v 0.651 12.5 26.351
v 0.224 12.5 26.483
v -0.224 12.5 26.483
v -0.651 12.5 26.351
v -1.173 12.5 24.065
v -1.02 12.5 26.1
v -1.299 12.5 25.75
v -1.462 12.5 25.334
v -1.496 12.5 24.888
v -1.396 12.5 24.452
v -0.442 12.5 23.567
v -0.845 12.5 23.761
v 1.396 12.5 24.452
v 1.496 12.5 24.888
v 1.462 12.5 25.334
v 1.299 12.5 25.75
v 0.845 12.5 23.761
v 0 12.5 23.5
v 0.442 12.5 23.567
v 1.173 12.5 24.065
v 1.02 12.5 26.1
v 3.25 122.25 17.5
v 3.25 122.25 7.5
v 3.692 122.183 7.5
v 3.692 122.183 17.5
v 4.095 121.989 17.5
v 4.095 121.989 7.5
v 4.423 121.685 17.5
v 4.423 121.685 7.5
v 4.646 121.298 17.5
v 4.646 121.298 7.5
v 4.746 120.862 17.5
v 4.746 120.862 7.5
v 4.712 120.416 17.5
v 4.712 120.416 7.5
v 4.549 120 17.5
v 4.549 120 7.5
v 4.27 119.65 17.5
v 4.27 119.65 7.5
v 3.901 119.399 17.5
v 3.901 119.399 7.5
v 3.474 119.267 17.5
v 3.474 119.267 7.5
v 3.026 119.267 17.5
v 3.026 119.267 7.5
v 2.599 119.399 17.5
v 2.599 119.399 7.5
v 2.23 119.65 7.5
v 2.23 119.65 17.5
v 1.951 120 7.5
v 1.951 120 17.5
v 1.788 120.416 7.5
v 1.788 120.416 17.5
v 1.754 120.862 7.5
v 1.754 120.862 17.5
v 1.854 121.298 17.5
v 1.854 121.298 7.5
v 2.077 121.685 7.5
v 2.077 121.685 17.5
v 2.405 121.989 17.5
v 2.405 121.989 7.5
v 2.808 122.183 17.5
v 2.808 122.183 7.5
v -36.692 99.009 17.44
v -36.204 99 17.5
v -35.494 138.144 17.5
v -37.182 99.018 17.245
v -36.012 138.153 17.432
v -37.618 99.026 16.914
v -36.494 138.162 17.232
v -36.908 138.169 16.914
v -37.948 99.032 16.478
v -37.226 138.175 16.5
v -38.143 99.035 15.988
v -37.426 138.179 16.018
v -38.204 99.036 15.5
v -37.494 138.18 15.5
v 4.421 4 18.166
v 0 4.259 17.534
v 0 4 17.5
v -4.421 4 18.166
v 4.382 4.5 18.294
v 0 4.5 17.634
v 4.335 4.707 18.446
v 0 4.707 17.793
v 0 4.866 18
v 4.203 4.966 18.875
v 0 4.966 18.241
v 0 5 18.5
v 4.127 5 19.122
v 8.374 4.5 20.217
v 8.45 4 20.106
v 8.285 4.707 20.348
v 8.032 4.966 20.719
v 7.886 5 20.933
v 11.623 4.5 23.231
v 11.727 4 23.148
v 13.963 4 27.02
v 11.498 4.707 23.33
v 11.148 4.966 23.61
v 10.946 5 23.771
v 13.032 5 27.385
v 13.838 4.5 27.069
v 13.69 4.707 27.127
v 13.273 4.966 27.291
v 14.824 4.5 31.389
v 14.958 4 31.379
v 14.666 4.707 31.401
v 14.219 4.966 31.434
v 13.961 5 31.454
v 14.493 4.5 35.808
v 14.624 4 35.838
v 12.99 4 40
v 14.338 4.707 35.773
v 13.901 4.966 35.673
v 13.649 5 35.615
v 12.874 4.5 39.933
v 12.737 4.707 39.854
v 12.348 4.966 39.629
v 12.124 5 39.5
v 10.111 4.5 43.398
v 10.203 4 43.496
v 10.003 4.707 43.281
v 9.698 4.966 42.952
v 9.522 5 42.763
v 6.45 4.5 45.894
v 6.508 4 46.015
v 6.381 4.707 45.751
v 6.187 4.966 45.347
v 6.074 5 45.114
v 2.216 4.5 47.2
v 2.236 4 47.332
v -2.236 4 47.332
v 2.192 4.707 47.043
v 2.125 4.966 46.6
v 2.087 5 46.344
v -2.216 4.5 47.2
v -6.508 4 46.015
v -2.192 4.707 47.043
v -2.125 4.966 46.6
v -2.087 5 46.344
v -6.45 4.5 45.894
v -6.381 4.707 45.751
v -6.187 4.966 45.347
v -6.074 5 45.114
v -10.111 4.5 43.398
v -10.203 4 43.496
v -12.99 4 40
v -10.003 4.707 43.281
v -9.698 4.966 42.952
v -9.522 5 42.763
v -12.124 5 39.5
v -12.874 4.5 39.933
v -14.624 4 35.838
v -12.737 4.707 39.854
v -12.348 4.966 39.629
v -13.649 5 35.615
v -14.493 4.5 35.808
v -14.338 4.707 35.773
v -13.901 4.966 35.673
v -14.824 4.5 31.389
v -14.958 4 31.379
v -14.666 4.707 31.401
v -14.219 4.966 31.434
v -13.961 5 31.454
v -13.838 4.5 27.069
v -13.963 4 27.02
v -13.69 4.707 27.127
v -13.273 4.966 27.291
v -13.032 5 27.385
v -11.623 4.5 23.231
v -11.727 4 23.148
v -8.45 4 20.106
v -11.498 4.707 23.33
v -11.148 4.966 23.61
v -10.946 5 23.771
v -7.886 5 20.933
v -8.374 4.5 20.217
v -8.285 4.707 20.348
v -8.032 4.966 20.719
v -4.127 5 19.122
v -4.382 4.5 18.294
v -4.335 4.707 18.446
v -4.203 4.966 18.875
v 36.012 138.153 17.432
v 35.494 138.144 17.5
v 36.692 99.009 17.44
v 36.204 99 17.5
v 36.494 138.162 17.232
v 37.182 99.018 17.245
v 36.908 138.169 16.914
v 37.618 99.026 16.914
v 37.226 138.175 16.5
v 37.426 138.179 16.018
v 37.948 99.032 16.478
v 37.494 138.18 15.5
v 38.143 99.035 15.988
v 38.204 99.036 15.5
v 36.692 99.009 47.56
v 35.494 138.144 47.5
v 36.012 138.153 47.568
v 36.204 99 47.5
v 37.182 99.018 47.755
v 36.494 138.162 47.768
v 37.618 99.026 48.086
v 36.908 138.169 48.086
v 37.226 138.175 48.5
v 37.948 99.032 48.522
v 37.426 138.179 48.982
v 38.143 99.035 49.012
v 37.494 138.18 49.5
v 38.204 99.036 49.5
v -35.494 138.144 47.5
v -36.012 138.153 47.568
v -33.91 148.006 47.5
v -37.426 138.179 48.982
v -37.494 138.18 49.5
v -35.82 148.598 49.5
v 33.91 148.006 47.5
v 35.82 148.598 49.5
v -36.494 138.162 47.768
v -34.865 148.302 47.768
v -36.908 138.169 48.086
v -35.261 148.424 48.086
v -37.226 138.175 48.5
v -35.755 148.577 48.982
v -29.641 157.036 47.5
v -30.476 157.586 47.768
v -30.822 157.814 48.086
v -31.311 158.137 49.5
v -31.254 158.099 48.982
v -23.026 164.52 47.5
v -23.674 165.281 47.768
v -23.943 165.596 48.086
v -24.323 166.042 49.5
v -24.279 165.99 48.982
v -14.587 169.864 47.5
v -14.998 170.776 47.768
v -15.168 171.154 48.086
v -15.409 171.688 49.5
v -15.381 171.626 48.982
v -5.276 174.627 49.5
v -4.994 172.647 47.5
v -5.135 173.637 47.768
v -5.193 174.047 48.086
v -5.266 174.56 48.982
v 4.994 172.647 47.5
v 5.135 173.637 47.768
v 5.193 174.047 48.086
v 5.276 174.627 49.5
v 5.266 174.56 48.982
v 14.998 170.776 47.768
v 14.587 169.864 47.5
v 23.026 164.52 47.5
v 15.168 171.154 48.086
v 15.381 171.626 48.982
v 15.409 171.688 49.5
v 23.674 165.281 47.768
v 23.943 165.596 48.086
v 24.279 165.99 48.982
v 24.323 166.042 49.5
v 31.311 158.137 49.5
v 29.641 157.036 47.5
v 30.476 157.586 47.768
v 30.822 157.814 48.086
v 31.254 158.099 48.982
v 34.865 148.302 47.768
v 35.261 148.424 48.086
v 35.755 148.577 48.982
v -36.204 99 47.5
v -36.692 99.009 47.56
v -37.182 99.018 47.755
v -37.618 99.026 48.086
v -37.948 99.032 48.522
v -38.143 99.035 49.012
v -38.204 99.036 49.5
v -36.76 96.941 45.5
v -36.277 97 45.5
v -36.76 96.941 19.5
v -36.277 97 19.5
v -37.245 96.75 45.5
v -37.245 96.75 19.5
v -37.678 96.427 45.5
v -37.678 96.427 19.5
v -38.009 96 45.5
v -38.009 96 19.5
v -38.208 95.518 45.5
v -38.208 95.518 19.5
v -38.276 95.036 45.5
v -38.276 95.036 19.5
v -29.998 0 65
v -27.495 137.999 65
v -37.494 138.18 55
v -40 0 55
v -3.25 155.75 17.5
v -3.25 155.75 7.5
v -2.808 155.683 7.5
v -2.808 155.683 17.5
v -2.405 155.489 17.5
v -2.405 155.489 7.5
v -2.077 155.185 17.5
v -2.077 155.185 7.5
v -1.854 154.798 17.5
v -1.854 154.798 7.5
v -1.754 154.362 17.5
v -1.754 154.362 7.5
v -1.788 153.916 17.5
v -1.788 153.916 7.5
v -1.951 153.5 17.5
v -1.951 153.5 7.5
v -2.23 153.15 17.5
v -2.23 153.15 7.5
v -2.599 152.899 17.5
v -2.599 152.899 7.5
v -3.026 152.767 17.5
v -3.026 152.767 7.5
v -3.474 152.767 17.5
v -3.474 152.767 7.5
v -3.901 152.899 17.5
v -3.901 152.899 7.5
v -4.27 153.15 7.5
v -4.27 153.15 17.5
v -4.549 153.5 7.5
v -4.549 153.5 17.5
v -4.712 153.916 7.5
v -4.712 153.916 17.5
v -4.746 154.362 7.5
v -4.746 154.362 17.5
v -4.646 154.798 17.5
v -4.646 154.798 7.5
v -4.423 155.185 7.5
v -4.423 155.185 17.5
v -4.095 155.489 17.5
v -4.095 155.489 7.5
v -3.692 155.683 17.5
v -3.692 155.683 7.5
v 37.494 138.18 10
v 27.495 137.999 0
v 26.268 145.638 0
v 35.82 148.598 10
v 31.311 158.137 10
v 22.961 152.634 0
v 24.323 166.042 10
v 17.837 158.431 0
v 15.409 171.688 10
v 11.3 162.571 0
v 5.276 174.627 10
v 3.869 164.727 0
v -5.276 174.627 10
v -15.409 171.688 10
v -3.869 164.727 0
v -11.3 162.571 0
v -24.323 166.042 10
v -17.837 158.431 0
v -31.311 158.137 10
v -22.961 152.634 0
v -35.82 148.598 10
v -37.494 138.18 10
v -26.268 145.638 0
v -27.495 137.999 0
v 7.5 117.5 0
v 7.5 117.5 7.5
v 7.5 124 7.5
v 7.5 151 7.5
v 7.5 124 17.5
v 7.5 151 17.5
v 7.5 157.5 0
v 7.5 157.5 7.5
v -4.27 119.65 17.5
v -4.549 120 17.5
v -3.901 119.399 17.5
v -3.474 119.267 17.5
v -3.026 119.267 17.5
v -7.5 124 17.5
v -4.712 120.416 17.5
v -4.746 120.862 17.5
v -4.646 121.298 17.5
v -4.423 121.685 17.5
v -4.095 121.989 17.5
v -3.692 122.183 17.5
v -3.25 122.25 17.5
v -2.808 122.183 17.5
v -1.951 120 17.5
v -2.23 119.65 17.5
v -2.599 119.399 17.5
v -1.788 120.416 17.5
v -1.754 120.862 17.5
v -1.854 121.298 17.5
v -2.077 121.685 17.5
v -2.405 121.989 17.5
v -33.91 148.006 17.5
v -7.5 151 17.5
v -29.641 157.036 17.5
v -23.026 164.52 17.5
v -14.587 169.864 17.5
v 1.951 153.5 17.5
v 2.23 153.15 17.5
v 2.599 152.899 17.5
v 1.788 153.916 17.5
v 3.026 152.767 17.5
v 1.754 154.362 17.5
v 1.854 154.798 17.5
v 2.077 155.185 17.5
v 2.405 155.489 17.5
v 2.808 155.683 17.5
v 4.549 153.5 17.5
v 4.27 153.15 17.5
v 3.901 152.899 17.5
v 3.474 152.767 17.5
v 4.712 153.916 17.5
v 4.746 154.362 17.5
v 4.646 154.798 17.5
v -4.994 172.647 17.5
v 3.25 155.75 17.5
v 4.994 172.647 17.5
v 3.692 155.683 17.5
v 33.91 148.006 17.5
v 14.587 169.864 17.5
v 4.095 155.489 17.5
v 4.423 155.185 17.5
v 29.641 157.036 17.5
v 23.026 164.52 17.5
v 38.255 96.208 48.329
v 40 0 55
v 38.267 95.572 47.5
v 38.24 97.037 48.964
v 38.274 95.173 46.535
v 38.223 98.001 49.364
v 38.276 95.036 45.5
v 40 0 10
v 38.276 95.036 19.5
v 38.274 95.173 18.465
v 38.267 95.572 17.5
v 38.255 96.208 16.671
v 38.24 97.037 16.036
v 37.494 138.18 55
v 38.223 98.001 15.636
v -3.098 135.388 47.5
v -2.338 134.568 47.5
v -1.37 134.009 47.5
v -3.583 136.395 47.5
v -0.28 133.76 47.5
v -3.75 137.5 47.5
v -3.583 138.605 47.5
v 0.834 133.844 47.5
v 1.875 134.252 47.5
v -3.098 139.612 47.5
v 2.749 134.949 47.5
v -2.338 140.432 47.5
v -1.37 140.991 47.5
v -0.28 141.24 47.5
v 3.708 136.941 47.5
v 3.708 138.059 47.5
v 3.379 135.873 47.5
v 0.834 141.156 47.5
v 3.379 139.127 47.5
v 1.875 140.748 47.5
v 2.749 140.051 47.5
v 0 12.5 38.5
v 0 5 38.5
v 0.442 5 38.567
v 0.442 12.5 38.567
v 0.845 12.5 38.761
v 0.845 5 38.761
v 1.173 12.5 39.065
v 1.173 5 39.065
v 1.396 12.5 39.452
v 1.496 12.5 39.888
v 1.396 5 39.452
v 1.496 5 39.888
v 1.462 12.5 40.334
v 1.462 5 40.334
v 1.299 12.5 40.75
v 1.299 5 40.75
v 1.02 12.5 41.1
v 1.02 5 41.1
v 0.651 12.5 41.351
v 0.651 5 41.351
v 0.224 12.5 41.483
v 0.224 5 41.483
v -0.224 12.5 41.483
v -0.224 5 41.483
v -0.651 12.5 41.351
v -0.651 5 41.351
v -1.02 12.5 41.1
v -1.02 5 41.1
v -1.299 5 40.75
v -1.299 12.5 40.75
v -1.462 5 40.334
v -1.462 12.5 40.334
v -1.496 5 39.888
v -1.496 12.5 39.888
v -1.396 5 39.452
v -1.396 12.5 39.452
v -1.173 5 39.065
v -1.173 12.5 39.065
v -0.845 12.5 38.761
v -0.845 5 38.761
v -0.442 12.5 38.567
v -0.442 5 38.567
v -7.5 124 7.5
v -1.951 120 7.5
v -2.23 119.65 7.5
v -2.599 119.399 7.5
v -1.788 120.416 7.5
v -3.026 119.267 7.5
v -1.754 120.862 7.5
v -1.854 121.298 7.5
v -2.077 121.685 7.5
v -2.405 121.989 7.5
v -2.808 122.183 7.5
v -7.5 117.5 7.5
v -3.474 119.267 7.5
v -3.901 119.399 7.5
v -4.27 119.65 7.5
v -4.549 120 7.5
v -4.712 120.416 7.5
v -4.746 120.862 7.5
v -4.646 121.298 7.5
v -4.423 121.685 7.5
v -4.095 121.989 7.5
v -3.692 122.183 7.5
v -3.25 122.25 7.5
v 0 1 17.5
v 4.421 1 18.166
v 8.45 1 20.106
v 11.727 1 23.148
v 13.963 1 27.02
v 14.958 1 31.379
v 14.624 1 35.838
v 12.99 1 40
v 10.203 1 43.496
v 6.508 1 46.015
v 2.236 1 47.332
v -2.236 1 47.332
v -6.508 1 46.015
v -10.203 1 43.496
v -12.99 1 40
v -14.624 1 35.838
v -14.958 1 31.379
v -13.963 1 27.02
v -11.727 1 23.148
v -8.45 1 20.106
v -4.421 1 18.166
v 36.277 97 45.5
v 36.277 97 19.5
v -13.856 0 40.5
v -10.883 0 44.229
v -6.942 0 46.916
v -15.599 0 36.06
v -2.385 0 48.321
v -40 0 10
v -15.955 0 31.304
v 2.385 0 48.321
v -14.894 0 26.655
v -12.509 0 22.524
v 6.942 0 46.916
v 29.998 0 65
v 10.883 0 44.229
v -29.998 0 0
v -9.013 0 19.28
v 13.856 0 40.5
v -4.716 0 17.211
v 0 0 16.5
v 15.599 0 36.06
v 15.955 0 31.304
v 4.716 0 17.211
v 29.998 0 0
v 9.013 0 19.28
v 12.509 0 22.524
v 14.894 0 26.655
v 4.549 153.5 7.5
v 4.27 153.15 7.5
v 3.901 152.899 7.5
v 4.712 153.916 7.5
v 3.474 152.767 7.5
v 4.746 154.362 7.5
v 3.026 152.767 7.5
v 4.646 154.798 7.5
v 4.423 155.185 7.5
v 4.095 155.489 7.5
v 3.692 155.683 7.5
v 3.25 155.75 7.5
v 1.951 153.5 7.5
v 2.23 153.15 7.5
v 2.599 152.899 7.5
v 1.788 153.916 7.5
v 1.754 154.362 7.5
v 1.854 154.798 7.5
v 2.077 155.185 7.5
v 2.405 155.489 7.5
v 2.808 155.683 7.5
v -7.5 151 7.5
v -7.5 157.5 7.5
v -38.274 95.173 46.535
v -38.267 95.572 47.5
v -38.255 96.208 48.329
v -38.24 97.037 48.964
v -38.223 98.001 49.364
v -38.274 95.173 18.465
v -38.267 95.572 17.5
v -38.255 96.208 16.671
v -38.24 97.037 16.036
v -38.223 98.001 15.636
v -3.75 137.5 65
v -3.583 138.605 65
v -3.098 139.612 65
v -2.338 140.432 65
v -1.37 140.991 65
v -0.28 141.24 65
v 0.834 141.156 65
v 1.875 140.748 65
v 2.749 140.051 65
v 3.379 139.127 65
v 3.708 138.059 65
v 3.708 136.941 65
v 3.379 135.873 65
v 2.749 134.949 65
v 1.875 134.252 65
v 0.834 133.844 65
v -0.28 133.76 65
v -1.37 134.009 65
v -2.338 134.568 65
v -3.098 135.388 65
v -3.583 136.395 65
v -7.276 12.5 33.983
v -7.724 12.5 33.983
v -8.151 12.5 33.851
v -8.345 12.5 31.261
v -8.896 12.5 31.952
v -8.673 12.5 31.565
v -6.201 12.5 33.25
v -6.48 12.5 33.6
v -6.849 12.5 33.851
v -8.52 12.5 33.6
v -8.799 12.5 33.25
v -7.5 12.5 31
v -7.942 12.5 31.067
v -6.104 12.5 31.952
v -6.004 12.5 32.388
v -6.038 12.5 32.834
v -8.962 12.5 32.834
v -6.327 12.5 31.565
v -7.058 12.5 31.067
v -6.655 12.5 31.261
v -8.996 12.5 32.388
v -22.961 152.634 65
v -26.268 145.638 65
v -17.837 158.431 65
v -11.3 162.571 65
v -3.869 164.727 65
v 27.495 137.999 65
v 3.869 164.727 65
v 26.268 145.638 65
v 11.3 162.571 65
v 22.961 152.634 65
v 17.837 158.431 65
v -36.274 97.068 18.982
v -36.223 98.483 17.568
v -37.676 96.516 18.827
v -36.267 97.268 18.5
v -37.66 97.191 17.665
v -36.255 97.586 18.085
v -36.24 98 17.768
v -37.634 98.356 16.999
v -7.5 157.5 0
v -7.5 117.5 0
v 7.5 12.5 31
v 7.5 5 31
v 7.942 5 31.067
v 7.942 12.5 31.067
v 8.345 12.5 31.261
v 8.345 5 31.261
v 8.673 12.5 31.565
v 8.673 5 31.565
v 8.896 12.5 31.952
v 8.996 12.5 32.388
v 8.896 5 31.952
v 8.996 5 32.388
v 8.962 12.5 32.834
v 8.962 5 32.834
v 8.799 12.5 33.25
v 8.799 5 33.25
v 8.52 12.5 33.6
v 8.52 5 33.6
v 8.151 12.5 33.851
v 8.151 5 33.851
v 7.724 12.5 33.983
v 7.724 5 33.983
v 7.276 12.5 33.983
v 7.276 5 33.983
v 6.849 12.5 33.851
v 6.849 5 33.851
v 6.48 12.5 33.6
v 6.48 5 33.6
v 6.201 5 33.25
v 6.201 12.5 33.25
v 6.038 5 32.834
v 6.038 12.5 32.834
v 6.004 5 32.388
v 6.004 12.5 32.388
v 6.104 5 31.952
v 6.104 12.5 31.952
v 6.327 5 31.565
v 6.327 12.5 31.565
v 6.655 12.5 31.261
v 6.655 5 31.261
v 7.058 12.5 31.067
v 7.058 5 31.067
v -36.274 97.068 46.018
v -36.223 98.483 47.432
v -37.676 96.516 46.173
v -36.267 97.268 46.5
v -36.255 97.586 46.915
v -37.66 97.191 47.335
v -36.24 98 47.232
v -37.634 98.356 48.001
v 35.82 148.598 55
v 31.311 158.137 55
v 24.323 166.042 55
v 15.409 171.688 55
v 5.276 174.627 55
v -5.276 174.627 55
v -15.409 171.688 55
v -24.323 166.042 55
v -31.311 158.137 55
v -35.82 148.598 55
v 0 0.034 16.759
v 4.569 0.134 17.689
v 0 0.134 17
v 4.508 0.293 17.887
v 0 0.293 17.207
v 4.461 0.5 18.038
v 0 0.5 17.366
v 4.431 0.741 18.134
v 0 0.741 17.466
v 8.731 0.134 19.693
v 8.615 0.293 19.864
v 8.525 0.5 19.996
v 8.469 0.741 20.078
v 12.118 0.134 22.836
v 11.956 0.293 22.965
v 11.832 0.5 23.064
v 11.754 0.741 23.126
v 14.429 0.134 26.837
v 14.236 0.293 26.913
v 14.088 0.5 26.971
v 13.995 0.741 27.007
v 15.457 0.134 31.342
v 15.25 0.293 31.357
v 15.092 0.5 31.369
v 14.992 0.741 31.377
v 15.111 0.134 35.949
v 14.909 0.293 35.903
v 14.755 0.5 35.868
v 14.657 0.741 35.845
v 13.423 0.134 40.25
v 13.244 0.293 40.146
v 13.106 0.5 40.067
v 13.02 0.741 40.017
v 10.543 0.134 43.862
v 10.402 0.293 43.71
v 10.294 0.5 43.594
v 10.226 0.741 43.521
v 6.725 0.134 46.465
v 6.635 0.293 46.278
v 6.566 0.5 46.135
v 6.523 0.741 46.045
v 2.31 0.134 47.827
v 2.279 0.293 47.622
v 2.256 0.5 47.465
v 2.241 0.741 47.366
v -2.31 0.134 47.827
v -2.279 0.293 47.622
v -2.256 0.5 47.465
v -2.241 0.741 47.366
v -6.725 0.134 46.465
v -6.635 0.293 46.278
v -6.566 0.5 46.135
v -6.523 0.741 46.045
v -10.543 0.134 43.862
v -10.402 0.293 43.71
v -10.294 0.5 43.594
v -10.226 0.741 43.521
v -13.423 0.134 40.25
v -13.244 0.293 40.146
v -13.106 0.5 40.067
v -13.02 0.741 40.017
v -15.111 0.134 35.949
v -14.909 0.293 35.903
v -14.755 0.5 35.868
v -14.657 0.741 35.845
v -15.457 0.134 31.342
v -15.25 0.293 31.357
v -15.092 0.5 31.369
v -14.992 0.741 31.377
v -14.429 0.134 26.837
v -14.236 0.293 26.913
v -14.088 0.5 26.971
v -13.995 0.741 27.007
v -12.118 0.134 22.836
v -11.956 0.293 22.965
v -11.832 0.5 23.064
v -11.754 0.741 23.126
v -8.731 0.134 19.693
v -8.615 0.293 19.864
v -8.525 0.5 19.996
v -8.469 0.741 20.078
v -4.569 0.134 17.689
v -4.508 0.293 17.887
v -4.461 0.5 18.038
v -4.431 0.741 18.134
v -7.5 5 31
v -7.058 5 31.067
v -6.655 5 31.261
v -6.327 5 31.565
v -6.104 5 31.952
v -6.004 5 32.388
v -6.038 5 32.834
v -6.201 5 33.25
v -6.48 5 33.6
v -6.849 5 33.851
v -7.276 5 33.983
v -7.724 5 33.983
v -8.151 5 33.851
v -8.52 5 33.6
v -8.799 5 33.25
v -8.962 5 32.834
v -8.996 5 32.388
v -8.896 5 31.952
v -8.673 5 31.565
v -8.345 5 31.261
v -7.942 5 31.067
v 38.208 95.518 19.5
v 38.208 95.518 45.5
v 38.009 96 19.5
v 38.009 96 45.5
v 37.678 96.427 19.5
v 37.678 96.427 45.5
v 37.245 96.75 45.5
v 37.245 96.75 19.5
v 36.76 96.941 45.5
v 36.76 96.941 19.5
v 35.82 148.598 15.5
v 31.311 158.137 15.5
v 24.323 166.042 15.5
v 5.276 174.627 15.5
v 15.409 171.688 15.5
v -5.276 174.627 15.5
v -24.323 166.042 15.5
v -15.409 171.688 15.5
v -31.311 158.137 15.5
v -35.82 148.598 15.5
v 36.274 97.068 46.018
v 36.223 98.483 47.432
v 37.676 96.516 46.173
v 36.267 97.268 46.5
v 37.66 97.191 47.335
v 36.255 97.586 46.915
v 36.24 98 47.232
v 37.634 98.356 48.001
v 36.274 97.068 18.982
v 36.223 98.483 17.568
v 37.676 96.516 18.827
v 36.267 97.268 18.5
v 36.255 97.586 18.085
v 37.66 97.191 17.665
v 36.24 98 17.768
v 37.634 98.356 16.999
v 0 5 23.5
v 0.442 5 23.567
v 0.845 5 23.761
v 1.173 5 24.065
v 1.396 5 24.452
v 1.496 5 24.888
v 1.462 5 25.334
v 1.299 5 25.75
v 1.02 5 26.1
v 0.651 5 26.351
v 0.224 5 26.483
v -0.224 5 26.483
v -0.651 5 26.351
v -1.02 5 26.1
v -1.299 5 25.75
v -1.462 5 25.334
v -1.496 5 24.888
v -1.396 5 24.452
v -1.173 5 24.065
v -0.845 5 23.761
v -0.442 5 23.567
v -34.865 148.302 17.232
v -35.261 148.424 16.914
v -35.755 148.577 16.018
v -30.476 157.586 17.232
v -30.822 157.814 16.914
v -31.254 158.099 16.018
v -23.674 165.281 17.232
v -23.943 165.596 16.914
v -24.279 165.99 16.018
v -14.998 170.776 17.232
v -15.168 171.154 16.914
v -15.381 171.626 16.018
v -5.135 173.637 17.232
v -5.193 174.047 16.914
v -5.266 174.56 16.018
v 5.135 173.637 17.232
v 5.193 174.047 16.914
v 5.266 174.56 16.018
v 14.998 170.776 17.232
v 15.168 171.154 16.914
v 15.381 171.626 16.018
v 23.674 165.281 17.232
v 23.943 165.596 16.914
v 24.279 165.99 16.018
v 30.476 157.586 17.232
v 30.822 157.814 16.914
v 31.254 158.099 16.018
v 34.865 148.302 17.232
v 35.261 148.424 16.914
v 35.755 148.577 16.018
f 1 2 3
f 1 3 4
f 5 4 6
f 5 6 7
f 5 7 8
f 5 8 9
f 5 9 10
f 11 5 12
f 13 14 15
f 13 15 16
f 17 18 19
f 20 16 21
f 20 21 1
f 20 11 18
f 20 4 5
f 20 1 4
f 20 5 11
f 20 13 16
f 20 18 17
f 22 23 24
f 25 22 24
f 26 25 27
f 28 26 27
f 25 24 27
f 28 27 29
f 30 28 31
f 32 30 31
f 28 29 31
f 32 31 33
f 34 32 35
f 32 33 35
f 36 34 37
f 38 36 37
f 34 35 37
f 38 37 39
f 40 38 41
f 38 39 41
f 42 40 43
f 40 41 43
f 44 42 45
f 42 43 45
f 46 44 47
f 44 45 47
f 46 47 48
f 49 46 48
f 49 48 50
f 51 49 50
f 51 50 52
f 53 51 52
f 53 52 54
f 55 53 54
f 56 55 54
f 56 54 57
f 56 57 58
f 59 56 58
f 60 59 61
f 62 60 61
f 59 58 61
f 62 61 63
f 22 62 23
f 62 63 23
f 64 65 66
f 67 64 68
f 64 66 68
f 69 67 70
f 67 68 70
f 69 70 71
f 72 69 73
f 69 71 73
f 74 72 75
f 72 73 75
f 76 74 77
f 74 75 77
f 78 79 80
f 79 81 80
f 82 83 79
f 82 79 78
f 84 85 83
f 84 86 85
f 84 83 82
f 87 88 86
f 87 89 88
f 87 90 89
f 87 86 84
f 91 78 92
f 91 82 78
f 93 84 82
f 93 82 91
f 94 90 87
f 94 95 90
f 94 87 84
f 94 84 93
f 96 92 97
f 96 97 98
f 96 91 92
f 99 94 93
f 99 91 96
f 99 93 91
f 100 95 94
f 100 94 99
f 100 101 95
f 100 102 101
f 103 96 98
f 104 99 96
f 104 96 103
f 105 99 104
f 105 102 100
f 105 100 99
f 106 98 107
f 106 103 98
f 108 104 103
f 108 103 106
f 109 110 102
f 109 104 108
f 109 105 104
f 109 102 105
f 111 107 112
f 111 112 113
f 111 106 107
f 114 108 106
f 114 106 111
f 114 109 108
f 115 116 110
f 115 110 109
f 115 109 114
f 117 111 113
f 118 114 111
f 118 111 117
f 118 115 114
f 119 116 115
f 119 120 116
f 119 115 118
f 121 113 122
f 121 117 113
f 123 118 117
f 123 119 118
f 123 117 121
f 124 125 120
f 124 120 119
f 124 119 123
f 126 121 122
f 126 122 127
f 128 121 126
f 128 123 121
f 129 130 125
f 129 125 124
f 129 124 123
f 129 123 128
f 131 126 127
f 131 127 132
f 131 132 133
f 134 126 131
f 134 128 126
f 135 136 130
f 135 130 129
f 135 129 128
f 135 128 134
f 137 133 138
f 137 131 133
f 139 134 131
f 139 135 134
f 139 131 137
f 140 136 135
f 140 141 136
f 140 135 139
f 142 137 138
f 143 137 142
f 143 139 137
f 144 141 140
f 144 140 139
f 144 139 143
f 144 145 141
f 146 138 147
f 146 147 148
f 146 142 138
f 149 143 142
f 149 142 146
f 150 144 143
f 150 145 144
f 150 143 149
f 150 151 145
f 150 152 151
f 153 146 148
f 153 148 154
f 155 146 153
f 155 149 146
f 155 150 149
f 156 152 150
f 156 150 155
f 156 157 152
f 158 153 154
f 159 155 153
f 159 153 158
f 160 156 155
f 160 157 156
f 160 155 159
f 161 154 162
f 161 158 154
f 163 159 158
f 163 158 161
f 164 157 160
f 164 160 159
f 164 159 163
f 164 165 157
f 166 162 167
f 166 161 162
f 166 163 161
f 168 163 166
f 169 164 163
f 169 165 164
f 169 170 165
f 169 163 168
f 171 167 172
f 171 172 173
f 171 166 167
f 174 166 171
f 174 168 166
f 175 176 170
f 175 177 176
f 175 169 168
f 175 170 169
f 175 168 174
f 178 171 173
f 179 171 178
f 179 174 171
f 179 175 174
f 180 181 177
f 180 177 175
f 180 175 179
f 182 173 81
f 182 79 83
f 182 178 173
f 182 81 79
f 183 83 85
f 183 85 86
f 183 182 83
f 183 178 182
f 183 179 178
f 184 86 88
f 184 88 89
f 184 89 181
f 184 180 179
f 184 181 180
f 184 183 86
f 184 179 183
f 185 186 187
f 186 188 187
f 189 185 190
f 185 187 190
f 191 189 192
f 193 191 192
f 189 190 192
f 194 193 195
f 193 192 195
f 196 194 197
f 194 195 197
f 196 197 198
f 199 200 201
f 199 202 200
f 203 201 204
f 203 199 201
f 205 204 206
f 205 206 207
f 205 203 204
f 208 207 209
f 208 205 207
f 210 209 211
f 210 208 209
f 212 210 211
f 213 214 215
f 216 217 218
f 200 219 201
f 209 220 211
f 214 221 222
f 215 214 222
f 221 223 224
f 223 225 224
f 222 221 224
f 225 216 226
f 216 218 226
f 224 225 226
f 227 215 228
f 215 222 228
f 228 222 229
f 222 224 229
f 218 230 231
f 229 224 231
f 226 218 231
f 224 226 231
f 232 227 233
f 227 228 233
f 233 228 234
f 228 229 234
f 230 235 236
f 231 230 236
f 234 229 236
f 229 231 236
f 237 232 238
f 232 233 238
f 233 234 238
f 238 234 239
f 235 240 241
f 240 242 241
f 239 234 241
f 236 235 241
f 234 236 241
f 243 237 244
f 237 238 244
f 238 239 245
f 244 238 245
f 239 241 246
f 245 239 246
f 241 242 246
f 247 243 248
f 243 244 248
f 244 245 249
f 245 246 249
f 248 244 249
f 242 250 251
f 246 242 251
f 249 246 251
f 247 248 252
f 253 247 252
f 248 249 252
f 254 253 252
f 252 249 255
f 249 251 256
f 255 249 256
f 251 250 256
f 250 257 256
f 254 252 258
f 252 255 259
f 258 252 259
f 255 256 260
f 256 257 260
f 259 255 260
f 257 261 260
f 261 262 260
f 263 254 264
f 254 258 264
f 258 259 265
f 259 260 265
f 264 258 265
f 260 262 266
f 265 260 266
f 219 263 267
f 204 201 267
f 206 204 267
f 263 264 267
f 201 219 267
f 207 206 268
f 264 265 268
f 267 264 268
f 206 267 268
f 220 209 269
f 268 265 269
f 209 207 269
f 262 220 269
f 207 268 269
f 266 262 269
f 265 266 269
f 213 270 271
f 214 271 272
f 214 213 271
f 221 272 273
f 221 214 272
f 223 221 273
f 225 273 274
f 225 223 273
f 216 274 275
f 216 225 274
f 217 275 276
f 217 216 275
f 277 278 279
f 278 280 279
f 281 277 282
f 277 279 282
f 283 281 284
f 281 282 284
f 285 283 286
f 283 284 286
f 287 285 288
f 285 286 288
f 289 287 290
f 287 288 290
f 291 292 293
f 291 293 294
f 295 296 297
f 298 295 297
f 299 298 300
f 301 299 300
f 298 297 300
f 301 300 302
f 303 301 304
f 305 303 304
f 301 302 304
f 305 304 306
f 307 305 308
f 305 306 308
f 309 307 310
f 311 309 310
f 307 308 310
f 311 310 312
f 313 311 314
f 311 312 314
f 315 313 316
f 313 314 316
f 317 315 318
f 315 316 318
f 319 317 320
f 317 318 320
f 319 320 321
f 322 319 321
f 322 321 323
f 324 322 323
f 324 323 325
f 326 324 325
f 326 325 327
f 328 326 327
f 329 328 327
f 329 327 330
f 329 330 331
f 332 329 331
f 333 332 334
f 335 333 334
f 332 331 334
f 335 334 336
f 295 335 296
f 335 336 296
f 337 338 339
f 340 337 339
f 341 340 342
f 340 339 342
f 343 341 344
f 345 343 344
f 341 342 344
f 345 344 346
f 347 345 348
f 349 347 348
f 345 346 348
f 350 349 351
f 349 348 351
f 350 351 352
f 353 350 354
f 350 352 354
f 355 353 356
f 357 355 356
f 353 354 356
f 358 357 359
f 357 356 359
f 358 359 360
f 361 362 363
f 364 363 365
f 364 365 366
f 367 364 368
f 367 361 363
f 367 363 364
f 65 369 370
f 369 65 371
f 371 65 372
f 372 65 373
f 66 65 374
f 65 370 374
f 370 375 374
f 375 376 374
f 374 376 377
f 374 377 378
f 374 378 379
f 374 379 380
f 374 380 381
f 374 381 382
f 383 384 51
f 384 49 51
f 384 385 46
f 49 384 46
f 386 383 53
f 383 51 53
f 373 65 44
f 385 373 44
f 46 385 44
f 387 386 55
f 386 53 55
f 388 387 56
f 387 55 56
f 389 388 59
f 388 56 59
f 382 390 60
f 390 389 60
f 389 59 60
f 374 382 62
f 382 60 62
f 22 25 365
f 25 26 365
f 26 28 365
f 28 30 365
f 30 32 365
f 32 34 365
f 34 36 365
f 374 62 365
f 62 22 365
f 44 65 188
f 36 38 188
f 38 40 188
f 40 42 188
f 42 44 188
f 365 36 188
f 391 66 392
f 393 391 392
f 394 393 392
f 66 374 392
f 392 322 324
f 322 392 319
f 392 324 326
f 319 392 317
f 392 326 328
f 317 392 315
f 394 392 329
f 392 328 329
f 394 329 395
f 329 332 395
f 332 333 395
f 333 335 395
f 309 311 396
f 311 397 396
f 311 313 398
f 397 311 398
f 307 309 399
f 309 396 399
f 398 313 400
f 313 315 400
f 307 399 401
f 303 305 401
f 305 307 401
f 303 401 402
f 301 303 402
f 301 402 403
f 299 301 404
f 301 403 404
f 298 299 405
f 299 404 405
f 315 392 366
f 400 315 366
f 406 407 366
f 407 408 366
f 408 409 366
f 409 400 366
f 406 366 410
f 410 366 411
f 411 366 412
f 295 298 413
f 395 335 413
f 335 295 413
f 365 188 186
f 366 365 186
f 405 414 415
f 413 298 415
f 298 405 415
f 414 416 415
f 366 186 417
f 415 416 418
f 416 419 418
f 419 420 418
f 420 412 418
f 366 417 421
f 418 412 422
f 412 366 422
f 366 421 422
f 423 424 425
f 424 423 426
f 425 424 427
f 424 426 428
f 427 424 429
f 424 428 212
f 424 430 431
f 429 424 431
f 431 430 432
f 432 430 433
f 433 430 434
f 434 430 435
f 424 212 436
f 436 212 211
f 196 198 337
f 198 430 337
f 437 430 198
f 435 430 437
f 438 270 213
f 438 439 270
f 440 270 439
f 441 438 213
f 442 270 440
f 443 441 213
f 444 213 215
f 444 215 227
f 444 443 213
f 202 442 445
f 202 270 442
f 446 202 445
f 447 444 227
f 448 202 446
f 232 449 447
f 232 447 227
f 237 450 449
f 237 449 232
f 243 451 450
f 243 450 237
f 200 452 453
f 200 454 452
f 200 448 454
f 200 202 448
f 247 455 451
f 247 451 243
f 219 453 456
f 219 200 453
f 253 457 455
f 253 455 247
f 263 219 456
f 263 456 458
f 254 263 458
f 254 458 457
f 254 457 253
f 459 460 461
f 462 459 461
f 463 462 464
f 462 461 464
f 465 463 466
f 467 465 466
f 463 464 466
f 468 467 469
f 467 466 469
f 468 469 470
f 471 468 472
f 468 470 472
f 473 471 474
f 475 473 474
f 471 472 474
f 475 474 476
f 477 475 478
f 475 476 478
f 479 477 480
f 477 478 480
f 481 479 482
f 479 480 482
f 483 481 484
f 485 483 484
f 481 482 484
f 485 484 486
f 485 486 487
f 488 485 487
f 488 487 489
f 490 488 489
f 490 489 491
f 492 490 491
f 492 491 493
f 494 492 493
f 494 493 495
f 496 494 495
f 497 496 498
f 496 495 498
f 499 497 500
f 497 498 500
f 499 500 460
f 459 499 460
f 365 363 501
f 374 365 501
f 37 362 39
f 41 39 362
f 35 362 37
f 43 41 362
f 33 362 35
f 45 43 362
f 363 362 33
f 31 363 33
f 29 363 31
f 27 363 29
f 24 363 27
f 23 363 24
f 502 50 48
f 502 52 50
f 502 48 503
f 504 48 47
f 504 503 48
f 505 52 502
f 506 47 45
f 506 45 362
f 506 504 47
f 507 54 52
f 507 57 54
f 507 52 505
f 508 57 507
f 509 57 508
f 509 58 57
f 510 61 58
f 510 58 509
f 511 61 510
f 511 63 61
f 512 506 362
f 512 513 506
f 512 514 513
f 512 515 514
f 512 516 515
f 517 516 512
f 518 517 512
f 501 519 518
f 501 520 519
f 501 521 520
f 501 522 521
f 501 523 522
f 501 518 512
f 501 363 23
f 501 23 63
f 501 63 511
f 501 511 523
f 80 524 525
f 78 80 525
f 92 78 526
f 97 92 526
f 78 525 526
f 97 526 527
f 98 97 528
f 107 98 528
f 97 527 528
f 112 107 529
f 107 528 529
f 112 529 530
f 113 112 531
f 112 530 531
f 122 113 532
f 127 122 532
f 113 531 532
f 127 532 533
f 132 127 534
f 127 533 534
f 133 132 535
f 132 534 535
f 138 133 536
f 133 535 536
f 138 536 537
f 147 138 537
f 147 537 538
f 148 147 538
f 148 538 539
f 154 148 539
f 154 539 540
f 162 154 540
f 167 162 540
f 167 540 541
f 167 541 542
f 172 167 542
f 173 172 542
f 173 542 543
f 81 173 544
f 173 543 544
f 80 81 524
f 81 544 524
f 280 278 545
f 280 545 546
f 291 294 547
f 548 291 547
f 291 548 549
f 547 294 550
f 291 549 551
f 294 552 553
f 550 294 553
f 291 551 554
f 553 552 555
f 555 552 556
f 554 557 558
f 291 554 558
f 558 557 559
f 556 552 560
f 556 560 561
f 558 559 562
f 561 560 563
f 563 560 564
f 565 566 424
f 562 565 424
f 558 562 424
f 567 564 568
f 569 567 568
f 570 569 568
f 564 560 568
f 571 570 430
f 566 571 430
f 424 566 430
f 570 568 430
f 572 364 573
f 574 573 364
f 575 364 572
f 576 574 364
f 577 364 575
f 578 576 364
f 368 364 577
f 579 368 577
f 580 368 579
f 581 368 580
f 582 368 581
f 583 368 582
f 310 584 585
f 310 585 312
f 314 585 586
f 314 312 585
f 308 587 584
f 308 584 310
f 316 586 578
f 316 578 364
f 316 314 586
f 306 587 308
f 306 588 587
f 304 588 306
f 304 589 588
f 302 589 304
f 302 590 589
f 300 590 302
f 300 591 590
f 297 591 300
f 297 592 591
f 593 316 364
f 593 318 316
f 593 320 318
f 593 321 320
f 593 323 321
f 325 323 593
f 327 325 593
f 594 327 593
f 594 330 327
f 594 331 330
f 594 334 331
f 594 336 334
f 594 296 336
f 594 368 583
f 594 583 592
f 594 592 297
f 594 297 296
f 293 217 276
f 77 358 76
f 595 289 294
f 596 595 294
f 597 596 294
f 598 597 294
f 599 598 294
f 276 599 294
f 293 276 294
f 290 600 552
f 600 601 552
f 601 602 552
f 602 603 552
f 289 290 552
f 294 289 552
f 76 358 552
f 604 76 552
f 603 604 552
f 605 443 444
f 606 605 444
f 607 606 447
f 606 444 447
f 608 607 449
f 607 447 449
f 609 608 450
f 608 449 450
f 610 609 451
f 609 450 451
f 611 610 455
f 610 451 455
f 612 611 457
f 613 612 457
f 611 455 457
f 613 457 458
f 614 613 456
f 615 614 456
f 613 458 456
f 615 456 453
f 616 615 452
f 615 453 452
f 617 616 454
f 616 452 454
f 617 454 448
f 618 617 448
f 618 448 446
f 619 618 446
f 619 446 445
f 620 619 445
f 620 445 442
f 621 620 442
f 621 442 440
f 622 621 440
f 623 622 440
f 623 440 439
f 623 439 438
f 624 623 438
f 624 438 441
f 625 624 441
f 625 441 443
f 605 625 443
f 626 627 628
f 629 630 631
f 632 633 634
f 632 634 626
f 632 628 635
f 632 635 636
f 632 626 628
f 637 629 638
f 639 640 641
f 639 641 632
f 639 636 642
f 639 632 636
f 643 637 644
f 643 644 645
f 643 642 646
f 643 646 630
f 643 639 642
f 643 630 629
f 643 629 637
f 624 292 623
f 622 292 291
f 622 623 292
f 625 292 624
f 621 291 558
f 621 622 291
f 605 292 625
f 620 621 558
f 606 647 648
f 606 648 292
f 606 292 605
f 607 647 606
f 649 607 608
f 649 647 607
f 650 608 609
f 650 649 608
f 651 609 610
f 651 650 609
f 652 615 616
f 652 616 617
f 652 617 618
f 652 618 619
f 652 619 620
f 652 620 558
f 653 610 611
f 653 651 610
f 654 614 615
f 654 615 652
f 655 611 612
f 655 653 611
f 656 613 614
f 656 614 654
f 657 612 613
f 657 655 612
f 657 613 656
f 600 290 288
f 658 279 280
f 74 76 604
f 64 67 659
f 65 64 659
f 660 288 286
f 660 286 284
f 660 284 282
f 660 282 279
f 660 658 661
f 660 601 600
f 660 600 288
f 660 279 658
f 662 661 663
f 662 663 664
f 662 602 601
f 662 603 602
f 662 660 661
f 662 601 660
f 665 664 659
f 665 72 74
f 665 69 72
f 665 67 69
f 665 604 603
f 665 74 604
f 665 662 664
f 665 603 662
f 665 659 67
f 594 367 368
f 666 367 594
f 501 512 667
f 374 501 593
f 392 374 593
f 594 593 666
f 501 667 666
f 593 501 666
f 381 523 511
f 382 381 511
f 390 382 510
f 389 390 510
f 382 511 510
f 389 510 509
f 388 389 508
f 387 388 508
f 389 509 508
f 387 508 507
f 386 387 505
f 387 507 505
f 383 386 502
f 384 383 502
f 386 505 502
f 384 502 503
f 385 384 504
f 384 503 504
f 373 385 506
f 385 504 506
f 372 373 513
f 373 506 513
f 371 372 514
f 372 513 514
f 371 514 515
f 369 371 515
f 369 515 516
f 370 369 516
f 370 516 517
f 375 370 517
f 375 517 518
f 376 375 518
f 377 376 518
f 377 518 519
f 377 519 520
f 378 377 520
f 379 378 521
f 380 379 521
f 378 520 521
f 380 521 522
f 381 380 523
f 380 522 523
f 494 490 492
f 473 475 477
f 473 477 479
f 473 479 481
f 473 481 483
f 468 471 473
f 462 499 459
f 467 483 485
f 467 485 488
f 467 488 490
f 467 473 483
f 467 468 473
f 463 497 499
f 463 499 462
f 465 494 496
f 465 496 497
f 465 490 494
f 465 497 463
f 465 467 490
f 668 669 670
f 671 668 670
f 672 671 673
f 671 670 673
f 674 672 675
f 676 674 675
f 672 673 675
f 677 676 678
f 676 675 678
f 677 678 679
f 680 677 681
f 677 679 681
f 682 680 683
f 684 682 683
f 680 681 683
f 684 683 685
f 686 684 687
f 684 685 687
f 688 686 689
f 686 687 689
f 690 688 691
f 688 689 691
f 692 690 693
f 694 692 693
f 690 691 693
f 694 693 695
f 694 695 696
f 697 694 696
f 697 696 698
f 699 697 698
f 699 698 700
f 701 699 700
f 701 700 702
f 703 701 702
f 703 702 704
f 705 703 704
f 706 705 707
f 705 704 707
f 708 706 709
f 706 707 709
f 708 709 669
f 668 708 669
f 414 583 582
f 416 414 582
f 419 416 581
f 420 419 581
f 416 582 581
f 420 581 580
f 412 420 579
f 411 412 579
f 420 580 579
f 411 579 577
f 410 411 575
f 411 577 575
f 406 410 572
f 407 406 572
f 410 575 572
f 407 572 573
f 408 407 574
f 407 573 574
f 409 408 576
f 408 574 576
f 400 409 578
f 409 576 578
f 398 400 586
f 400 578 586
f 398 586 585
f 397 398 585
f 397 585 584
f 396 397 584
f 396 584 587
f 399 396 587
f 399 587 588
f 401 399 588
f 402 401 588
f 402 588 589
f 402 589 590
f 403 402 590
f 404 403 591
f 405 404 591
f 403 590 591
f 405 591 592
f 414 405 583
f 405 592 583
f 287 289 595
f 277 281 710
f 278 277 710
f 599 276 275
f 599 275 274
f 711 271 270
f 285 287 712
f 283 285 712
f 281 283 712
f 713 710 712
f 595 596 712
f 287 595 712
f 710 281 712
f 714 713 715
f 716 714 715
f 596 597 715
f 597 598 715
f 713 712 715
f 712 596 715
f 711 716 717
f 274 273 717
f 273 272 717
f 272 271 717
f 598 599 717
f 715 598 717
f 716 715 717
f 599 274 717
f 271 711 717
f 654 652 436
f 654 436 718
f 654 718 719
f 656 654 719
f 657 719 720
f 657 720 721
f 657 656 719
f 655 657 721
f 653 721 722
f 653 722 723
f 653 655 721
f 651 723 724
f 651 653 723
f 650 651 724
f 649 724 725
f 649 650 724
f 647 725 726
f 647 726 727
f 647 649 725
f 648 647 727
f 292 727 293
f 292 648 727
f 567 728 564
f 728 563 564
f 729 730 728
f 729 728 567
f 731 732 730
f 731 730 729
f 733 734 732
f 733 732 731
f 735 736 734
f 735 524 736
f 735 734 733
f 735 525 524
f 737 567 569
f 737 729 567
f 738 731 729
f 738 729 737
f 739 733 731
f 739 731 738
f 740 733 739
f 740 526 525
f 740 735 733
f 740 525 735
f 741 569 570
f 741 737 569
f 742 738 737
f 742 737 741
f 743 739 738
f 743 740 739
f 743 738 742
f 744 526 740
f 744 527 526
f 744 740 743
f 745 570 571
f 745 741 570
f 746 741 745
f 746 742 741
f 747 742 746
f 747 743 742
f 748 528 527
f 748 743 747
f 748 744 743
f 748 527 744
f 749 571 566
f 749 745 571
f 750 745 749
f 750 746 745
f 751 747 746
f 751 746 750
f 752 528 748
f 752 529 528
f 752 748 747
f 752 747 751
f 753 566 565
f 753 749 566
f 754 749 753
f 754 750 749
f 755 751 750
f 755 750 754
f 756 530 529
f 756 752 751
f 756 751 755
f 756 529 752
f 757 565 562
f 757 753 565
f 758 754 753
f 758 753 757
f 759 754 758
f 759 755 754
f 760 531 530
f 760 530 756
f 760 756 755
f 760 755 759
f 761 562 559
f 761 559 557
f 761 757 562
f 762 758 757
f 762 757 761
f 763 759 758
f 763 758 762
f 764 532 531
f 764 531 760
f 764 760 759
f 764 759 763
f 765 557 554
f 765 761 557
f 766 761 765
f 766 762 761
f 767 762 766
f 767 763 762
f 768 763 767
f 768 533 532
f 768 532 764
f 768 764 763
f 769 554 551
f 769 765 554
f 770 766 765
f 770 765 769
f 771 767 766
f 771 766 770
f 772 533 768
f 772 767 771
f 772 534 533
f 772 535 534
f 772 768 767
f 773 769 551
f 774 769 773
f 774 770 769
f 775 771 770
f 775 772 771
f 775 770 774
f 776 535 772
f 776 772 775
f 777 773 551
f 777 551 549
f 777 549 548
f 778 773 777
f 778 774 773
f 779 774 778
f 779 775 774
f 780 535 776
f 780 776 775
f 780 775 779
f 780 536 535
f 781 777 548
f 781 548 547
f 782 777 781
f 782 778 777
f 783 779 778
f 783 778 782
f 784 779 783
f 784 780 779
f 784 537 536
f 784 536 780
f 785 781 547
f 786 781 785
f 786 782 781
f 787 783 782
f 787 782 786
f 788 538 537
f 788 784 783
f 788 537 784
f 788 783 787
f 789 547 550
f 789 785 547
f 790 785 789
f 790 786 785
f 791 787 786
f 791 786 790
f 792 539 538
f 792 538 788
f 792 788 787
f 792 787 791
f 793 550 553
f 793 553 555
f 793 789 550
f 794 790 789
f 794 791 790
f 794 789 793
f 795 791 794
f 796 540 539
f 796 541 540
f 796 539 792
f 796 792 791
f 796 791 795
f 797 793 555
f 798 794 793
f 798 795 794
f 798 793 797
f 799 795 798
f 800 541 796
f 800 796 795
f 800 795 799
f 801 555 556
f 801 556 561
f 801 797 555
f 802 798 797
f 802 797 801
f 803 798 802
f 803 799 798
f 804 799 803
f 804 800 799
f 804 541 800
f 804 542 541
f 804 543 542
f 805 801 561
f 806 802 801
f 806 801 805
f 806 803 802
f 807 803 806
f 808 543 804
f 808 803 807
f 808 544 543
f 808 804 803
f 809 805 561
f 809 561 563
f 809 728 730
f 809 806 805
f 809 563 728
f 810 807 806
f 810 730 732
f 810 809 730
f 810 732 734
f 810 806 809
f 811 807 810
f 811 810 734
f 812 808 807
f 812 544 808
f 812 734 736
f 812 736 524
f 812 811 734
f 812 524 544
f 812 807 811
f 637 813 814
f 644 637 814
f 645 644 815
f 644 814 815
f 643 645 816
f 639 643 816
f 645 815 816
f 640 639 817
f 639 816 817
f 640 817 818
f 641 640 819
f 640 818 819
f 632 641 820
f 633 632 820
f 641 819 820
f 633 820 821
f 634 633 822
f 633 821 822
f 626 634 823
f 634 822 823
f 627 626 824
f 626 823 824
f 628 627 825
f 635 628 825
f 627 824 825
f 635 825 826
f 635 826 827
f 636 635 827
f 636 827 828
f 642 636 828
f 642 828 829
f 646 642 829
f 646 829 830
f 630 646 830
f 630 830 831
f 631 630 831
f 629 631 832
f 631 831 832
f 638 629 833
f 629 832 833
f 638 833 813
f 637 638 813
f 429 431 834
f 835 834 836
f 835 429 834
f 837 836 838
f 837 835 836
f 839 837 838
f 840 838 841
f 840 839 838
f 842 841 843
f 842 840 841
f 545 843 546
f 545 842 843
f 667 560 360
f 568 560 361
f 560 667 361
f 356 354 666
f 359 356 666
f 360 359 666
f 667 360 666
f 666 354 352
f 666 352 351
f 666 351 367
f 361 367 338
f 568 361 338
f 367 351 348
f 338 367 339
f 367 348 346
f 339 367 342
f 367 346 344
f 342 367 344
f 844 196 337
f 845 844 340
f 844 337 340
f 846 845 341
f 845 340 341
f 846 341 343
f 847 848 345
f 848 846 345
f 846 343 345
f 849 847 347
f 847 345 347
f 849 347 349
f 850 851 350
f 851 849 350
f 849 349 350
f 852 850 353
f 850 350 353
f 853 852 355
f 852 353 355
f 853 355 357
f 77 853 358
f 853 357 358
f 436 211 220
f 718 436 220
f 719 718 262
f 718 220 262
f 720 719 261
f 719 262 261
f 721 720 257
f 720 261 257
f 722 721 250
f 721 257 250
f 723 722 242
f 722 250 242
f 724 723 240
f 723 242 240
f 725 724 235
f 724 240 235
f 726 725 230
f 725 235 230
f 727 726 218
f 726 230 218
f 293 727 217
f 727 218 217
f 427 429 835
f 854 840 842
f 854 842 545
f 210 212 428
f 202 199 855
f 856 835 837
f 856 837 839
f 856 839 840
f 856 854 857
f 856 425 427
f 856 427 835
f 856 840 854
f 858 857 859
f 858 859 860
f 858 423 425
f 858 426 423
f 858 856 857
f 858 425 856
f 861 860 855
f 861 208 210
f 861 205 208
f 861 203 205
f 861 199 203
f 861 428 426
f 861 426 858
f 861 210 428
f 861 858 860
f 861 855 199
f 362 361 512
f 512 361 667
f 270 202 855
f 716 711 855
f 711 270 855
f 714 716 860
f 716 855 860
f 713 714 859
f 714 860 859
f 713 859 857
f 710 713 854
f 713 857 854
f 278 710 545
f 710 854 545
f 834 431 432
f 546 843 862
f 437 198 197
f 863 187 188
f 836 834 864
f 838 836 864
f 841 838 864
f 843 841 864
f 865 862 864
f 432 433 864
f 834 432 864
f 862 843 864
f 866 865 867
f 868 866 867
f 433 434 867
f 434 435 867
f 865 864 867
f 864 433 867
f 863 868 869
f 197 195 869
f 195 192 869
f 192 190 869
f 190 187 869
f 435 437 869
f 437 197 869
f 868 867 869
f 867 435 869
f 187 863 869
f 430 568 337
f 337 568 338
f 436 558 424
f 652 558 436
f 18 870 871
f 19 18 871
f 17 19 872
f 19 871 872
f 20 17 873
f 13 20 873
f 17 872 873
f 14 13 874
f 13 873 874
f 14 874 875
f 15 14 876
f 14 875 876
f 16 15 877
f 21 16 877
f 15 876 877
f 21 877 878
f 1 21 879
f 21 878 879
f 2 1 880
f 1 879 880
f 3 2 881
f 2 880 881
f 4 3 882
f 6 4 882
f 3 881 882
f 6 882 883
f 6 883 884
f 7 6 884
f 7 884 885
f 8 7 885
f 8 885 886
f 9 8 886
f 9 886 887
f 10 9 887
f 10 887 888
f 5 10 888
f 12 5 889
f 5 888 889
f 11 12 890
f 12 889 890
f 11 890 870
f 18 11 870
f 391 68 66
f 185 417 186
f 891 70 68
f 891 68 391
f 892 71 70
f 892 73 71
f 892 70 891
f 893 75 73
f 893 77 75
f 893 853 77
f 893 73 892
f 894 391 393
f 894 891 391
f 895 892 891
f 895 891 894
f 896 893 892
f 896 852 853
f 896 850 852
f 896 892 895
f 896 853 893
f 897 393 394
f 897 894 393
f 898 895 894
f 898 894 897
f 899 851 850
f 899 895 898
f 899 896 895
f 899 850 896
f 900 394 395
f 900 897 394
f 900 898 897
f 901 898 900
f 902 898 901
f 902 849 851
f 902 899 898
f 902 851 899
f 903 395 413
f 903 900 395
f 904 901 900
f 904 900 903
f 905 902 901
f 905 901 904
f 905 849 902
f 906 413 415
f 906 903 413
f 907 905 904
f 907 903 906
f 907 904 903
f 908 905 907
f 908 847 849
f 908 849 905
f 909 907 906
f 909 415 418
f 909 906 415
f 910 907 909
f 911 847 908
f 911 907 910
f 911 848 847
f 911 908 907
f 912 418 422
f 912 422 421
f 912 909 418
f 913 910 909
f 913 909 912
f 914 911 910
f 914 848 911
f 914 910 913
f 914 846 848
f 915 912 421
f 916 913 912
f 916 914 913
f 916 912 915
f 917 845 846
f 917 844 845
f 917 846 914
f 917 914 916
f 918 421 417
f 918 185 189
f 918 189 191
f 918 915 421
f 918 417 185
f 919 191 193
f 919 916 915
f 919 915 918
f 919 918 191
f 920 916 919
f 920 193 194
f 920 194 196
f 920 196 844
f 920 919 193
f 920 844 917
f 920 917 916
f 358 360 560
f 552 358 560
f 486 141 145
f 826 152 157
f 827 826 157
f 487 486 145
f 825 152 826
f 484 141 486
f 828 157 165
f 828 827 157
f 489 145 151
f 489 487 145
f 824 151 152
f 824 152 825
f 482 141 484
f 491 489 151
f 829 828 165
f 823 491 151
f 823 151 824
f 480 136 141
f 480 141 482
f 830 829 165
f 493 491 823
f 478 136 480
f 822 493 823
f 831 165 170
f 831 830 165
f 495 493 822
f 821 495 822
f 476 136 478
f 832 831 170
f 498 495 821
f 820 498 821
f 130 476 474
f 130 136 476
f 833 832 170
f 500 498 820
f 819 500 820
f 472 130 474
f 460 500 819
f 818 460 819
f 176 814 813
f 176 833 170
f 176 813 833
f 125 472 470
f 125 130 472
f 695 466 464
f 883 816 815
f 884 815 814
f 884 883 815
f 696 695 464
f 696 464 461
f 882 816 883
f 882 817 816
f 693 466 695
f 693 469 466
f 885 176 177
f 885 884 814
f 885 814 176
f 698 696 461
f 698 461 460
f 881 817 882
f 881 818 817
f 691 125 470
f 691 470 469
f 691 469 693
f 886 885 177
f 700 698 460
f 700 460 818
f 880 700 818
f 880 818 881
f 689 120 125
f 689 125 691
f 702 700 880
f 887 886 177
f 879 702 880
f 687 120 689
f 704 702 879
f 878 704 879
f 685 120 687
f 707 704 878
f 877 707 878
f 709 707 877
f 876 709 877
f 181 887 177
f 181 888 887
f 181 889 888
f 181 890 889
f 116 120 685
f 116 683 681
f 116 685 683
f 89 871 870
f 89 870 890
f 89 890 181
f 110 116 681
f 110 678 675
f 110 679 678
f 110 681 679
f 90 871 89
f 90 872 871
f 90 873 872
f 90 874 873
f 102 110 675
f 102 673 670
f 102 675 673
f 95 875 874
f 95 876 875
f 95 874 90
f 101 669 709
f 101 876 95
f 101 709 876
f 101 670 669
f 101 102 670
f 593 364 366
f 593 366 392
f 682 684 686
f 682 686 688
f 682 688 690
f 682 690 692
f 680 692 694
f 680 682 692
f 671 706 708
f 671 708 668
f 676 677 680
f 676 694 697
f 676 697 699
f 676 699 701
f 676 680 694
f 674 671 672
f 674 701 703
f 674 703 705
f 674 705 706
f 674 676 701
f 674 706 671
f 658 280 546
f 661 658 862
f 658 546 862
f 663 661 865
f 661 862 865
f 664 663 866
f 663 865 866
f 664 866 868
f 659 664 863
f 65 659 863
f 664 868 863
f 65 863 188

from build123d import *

# Parameters (mm, degrees)
BOSS_EXTRUDE1_DEPTH = 65
CHAMFER1_SIZE       = 10
SKETCH2_R           = 15
CUT_EXTRUDE1_DEPTH  = 5
SKETCH4_R           = 1.5
CUT_EXTRUDE2_DEPTH  = 7.5
FILLET1_R           = 1
SKETCH5_W           = 30
SKETCH5_H           = 78
CUT_EXTRUDE3_DEPTH  = 44.75
FILLET2_R           = 2
SKETCH6_W           = 15
SKETCH6_H           = 40
CUT_EXTRUDE4_DEPTH  = 7.5
SKETCH7_W           = 15
SKETCH7_H           = 27
SKETCH7_R           = 1.5
CUT_EXTRUDE5_DEPTH  = 10
SKETCH8_R           = 3.75
CUT_EXTRUDE6_DEPTH  = 191.918831033


with BuildPart() as part:
    # Sketch1 → Boss-Extrude1 (new body)
    with BuildSketch(Plane.XY):
        with BuildLine():
            Line((-40, 0), (40, 0))
            Line((40, 0), (37.493833718, 138.180024354))
            ThreePointArc((37.493833718, 138.180024354), (0, 175), (-37.493833718, 138.180024354))
            Line((-37.493833718, 138.180024354), (-40, 0))
        make_face()
    extrude(amount=BOSS_EXTRUDE1_DEPTH)

    # Chamfer1
    chamfer1_edges = [part.edges().sort_by_distance(p)[0] for p in [
        (-38.746916859, 69.090012177, 65),
        (38.746916859, 69.090012177, 65),
        (-38.746916859, 69.090012177, 0),
        (0, 175, 0),
        (38.746916859, 69.090012177, 0),
        (0, 175, 65),
    ]]
    chamfer(chamfer1_edges, length=CHAMFER1_SIZE)

    # Sketch2 → Cut-Extrude1 (cut)
    with BuildSketch(Plane(origin=(0, 0, 0), x_dir=(-1, 0, 0), z_dir=(0, -1, 0))):
        with Locations(Location((0, -32.5, 0), (0, 0, 90))):
            Circle(SKETCH2_R)
    extrude(amount=-CUT_EXTRUDE1_DEPTH, mode=Mode.SUBTRACT)

    # Sketch4 → Cut-Extrude2 (cut)
    with BuildSketch(Plane.XZ.offset(-5)):
        with Locations(Location((0, 40, 0), (0, 0, 270))):
            Circle(SKETCH4_R)
        with Locations(Location((7.5, 32.5, 0), (0, 0, 270))):
            Circle(SKETCH4_R)
        with Locations(Location((0, 25, 0), (0, 0, 270))):
            Circle(SKETCH4_R)
        with Locations(Location((-7.5, 32.5, 0), (0, 0, 270))):
            Circle(SKETCH4_R)
    extrude(amount=-CUT_EXTRUDE2_DEPTH, mode=Mode.SUBTRACT)

    # Fillet1
    fillet1_edges = [part.edges().sort_by_distance(p)[0] for p in [
        (0, 5, 47.5),
        (0, 0, 47.5),
    ]]
    fillet(fillet1_edges, radius=FILLET1_R)

    # Sketch5 → Cut-Extrude3 (cut, symmetric)
    with BuildSketch(Plane(origin=(0, 0, 0), x_dir=(0, 0, -1), z_dir=(1, 0, 0))):
        with Locations((-32.5, 136)):
            Rectangle(SKETCH5_W, SKETCH5_H)
    extrude(amount=CUT_EXTRUDE3_DEPTH, both=True, mode=Mode.SUBTRACT)

    # Fillet2
    fillet2_edges = [part.edges().sort_by_distance(p)[0] for p in [
        (-38.240714383, 97, 32.5),
        (-37.867274051, 117.590012177, 47.5),
        (-37.867274051, 117.590012177, 17.5),
        (0, 97, 17.5),
        (37.867274051, 117.590012177, 17.5),
        (0, 175, 17.5),
        (0, 175, 47.5),
        (37.867274051, 117.590012177, 47.5),
        (0, 97, 47.5),
        (38.240714383, 97, 32.5),
    ]]
    fillet(fillet2_edges, radius=FILLET2_R)

    # Sketch6 → Cut-Extrude4 (cut)
    with BuildSketch(Plane(origin=(0, 0, 0), x_dir=(-1, 0, 0), z_dir=(0, 0, -1))):
        with Locations((0, 137.5)):
            Rectangle(SKETCH6_W, SKETCH6_H)
    extrude(amount=-CUT_EXTRUDE4_DEPTH, mode=Mode.SUBTRACT)

    # Sketch7 → Cut-Extrude5 (cut)
    with BuildSketch(Plane(origin=(0, 0, 7.5), x_dir=(-1, 0, 0), z_dir=(0, 0, -1))):
        with Locations((0, 137.5)):
            Rectangle(SKETCH7_W, SKETCH7_H)
        with Locations(Location((-3.25, 154.25, 0), (0, 0, 90))):
            Circle(SKETCH7_R)
        with Locations(Location((3.25, 154.25, 0), (0, 0, 90))):
            Circle(SKETCH7_R)
        with Locations(Location((-3.25, 120.75, 0), (0, 0, 90))):
            Circle(SKETCH7_R)
        with Locations(Location((3.25, 120.75, 0), (0, 0, 90))):
            Circle(SKETCH7_R)
    extrude(amount=-CUT_EXTRUDE5_DEPTH, mode=Mode.SUBTRACT)

    # Sketch8 → Cut-Extrude6 (cut, through all)
    with BuildSketch(Plane(origin=(0, 0, 0), x_dir=(-1, 0, 0), z_dir=(0, 0, -1))):
        with Locations((0, 137.5)):
            Circle(SKETCH8_R)
    extrude(amount=-CUT_EXTRUDE6_DEPTH, mode=Mode.SUBTRACT)


solid = part.part
